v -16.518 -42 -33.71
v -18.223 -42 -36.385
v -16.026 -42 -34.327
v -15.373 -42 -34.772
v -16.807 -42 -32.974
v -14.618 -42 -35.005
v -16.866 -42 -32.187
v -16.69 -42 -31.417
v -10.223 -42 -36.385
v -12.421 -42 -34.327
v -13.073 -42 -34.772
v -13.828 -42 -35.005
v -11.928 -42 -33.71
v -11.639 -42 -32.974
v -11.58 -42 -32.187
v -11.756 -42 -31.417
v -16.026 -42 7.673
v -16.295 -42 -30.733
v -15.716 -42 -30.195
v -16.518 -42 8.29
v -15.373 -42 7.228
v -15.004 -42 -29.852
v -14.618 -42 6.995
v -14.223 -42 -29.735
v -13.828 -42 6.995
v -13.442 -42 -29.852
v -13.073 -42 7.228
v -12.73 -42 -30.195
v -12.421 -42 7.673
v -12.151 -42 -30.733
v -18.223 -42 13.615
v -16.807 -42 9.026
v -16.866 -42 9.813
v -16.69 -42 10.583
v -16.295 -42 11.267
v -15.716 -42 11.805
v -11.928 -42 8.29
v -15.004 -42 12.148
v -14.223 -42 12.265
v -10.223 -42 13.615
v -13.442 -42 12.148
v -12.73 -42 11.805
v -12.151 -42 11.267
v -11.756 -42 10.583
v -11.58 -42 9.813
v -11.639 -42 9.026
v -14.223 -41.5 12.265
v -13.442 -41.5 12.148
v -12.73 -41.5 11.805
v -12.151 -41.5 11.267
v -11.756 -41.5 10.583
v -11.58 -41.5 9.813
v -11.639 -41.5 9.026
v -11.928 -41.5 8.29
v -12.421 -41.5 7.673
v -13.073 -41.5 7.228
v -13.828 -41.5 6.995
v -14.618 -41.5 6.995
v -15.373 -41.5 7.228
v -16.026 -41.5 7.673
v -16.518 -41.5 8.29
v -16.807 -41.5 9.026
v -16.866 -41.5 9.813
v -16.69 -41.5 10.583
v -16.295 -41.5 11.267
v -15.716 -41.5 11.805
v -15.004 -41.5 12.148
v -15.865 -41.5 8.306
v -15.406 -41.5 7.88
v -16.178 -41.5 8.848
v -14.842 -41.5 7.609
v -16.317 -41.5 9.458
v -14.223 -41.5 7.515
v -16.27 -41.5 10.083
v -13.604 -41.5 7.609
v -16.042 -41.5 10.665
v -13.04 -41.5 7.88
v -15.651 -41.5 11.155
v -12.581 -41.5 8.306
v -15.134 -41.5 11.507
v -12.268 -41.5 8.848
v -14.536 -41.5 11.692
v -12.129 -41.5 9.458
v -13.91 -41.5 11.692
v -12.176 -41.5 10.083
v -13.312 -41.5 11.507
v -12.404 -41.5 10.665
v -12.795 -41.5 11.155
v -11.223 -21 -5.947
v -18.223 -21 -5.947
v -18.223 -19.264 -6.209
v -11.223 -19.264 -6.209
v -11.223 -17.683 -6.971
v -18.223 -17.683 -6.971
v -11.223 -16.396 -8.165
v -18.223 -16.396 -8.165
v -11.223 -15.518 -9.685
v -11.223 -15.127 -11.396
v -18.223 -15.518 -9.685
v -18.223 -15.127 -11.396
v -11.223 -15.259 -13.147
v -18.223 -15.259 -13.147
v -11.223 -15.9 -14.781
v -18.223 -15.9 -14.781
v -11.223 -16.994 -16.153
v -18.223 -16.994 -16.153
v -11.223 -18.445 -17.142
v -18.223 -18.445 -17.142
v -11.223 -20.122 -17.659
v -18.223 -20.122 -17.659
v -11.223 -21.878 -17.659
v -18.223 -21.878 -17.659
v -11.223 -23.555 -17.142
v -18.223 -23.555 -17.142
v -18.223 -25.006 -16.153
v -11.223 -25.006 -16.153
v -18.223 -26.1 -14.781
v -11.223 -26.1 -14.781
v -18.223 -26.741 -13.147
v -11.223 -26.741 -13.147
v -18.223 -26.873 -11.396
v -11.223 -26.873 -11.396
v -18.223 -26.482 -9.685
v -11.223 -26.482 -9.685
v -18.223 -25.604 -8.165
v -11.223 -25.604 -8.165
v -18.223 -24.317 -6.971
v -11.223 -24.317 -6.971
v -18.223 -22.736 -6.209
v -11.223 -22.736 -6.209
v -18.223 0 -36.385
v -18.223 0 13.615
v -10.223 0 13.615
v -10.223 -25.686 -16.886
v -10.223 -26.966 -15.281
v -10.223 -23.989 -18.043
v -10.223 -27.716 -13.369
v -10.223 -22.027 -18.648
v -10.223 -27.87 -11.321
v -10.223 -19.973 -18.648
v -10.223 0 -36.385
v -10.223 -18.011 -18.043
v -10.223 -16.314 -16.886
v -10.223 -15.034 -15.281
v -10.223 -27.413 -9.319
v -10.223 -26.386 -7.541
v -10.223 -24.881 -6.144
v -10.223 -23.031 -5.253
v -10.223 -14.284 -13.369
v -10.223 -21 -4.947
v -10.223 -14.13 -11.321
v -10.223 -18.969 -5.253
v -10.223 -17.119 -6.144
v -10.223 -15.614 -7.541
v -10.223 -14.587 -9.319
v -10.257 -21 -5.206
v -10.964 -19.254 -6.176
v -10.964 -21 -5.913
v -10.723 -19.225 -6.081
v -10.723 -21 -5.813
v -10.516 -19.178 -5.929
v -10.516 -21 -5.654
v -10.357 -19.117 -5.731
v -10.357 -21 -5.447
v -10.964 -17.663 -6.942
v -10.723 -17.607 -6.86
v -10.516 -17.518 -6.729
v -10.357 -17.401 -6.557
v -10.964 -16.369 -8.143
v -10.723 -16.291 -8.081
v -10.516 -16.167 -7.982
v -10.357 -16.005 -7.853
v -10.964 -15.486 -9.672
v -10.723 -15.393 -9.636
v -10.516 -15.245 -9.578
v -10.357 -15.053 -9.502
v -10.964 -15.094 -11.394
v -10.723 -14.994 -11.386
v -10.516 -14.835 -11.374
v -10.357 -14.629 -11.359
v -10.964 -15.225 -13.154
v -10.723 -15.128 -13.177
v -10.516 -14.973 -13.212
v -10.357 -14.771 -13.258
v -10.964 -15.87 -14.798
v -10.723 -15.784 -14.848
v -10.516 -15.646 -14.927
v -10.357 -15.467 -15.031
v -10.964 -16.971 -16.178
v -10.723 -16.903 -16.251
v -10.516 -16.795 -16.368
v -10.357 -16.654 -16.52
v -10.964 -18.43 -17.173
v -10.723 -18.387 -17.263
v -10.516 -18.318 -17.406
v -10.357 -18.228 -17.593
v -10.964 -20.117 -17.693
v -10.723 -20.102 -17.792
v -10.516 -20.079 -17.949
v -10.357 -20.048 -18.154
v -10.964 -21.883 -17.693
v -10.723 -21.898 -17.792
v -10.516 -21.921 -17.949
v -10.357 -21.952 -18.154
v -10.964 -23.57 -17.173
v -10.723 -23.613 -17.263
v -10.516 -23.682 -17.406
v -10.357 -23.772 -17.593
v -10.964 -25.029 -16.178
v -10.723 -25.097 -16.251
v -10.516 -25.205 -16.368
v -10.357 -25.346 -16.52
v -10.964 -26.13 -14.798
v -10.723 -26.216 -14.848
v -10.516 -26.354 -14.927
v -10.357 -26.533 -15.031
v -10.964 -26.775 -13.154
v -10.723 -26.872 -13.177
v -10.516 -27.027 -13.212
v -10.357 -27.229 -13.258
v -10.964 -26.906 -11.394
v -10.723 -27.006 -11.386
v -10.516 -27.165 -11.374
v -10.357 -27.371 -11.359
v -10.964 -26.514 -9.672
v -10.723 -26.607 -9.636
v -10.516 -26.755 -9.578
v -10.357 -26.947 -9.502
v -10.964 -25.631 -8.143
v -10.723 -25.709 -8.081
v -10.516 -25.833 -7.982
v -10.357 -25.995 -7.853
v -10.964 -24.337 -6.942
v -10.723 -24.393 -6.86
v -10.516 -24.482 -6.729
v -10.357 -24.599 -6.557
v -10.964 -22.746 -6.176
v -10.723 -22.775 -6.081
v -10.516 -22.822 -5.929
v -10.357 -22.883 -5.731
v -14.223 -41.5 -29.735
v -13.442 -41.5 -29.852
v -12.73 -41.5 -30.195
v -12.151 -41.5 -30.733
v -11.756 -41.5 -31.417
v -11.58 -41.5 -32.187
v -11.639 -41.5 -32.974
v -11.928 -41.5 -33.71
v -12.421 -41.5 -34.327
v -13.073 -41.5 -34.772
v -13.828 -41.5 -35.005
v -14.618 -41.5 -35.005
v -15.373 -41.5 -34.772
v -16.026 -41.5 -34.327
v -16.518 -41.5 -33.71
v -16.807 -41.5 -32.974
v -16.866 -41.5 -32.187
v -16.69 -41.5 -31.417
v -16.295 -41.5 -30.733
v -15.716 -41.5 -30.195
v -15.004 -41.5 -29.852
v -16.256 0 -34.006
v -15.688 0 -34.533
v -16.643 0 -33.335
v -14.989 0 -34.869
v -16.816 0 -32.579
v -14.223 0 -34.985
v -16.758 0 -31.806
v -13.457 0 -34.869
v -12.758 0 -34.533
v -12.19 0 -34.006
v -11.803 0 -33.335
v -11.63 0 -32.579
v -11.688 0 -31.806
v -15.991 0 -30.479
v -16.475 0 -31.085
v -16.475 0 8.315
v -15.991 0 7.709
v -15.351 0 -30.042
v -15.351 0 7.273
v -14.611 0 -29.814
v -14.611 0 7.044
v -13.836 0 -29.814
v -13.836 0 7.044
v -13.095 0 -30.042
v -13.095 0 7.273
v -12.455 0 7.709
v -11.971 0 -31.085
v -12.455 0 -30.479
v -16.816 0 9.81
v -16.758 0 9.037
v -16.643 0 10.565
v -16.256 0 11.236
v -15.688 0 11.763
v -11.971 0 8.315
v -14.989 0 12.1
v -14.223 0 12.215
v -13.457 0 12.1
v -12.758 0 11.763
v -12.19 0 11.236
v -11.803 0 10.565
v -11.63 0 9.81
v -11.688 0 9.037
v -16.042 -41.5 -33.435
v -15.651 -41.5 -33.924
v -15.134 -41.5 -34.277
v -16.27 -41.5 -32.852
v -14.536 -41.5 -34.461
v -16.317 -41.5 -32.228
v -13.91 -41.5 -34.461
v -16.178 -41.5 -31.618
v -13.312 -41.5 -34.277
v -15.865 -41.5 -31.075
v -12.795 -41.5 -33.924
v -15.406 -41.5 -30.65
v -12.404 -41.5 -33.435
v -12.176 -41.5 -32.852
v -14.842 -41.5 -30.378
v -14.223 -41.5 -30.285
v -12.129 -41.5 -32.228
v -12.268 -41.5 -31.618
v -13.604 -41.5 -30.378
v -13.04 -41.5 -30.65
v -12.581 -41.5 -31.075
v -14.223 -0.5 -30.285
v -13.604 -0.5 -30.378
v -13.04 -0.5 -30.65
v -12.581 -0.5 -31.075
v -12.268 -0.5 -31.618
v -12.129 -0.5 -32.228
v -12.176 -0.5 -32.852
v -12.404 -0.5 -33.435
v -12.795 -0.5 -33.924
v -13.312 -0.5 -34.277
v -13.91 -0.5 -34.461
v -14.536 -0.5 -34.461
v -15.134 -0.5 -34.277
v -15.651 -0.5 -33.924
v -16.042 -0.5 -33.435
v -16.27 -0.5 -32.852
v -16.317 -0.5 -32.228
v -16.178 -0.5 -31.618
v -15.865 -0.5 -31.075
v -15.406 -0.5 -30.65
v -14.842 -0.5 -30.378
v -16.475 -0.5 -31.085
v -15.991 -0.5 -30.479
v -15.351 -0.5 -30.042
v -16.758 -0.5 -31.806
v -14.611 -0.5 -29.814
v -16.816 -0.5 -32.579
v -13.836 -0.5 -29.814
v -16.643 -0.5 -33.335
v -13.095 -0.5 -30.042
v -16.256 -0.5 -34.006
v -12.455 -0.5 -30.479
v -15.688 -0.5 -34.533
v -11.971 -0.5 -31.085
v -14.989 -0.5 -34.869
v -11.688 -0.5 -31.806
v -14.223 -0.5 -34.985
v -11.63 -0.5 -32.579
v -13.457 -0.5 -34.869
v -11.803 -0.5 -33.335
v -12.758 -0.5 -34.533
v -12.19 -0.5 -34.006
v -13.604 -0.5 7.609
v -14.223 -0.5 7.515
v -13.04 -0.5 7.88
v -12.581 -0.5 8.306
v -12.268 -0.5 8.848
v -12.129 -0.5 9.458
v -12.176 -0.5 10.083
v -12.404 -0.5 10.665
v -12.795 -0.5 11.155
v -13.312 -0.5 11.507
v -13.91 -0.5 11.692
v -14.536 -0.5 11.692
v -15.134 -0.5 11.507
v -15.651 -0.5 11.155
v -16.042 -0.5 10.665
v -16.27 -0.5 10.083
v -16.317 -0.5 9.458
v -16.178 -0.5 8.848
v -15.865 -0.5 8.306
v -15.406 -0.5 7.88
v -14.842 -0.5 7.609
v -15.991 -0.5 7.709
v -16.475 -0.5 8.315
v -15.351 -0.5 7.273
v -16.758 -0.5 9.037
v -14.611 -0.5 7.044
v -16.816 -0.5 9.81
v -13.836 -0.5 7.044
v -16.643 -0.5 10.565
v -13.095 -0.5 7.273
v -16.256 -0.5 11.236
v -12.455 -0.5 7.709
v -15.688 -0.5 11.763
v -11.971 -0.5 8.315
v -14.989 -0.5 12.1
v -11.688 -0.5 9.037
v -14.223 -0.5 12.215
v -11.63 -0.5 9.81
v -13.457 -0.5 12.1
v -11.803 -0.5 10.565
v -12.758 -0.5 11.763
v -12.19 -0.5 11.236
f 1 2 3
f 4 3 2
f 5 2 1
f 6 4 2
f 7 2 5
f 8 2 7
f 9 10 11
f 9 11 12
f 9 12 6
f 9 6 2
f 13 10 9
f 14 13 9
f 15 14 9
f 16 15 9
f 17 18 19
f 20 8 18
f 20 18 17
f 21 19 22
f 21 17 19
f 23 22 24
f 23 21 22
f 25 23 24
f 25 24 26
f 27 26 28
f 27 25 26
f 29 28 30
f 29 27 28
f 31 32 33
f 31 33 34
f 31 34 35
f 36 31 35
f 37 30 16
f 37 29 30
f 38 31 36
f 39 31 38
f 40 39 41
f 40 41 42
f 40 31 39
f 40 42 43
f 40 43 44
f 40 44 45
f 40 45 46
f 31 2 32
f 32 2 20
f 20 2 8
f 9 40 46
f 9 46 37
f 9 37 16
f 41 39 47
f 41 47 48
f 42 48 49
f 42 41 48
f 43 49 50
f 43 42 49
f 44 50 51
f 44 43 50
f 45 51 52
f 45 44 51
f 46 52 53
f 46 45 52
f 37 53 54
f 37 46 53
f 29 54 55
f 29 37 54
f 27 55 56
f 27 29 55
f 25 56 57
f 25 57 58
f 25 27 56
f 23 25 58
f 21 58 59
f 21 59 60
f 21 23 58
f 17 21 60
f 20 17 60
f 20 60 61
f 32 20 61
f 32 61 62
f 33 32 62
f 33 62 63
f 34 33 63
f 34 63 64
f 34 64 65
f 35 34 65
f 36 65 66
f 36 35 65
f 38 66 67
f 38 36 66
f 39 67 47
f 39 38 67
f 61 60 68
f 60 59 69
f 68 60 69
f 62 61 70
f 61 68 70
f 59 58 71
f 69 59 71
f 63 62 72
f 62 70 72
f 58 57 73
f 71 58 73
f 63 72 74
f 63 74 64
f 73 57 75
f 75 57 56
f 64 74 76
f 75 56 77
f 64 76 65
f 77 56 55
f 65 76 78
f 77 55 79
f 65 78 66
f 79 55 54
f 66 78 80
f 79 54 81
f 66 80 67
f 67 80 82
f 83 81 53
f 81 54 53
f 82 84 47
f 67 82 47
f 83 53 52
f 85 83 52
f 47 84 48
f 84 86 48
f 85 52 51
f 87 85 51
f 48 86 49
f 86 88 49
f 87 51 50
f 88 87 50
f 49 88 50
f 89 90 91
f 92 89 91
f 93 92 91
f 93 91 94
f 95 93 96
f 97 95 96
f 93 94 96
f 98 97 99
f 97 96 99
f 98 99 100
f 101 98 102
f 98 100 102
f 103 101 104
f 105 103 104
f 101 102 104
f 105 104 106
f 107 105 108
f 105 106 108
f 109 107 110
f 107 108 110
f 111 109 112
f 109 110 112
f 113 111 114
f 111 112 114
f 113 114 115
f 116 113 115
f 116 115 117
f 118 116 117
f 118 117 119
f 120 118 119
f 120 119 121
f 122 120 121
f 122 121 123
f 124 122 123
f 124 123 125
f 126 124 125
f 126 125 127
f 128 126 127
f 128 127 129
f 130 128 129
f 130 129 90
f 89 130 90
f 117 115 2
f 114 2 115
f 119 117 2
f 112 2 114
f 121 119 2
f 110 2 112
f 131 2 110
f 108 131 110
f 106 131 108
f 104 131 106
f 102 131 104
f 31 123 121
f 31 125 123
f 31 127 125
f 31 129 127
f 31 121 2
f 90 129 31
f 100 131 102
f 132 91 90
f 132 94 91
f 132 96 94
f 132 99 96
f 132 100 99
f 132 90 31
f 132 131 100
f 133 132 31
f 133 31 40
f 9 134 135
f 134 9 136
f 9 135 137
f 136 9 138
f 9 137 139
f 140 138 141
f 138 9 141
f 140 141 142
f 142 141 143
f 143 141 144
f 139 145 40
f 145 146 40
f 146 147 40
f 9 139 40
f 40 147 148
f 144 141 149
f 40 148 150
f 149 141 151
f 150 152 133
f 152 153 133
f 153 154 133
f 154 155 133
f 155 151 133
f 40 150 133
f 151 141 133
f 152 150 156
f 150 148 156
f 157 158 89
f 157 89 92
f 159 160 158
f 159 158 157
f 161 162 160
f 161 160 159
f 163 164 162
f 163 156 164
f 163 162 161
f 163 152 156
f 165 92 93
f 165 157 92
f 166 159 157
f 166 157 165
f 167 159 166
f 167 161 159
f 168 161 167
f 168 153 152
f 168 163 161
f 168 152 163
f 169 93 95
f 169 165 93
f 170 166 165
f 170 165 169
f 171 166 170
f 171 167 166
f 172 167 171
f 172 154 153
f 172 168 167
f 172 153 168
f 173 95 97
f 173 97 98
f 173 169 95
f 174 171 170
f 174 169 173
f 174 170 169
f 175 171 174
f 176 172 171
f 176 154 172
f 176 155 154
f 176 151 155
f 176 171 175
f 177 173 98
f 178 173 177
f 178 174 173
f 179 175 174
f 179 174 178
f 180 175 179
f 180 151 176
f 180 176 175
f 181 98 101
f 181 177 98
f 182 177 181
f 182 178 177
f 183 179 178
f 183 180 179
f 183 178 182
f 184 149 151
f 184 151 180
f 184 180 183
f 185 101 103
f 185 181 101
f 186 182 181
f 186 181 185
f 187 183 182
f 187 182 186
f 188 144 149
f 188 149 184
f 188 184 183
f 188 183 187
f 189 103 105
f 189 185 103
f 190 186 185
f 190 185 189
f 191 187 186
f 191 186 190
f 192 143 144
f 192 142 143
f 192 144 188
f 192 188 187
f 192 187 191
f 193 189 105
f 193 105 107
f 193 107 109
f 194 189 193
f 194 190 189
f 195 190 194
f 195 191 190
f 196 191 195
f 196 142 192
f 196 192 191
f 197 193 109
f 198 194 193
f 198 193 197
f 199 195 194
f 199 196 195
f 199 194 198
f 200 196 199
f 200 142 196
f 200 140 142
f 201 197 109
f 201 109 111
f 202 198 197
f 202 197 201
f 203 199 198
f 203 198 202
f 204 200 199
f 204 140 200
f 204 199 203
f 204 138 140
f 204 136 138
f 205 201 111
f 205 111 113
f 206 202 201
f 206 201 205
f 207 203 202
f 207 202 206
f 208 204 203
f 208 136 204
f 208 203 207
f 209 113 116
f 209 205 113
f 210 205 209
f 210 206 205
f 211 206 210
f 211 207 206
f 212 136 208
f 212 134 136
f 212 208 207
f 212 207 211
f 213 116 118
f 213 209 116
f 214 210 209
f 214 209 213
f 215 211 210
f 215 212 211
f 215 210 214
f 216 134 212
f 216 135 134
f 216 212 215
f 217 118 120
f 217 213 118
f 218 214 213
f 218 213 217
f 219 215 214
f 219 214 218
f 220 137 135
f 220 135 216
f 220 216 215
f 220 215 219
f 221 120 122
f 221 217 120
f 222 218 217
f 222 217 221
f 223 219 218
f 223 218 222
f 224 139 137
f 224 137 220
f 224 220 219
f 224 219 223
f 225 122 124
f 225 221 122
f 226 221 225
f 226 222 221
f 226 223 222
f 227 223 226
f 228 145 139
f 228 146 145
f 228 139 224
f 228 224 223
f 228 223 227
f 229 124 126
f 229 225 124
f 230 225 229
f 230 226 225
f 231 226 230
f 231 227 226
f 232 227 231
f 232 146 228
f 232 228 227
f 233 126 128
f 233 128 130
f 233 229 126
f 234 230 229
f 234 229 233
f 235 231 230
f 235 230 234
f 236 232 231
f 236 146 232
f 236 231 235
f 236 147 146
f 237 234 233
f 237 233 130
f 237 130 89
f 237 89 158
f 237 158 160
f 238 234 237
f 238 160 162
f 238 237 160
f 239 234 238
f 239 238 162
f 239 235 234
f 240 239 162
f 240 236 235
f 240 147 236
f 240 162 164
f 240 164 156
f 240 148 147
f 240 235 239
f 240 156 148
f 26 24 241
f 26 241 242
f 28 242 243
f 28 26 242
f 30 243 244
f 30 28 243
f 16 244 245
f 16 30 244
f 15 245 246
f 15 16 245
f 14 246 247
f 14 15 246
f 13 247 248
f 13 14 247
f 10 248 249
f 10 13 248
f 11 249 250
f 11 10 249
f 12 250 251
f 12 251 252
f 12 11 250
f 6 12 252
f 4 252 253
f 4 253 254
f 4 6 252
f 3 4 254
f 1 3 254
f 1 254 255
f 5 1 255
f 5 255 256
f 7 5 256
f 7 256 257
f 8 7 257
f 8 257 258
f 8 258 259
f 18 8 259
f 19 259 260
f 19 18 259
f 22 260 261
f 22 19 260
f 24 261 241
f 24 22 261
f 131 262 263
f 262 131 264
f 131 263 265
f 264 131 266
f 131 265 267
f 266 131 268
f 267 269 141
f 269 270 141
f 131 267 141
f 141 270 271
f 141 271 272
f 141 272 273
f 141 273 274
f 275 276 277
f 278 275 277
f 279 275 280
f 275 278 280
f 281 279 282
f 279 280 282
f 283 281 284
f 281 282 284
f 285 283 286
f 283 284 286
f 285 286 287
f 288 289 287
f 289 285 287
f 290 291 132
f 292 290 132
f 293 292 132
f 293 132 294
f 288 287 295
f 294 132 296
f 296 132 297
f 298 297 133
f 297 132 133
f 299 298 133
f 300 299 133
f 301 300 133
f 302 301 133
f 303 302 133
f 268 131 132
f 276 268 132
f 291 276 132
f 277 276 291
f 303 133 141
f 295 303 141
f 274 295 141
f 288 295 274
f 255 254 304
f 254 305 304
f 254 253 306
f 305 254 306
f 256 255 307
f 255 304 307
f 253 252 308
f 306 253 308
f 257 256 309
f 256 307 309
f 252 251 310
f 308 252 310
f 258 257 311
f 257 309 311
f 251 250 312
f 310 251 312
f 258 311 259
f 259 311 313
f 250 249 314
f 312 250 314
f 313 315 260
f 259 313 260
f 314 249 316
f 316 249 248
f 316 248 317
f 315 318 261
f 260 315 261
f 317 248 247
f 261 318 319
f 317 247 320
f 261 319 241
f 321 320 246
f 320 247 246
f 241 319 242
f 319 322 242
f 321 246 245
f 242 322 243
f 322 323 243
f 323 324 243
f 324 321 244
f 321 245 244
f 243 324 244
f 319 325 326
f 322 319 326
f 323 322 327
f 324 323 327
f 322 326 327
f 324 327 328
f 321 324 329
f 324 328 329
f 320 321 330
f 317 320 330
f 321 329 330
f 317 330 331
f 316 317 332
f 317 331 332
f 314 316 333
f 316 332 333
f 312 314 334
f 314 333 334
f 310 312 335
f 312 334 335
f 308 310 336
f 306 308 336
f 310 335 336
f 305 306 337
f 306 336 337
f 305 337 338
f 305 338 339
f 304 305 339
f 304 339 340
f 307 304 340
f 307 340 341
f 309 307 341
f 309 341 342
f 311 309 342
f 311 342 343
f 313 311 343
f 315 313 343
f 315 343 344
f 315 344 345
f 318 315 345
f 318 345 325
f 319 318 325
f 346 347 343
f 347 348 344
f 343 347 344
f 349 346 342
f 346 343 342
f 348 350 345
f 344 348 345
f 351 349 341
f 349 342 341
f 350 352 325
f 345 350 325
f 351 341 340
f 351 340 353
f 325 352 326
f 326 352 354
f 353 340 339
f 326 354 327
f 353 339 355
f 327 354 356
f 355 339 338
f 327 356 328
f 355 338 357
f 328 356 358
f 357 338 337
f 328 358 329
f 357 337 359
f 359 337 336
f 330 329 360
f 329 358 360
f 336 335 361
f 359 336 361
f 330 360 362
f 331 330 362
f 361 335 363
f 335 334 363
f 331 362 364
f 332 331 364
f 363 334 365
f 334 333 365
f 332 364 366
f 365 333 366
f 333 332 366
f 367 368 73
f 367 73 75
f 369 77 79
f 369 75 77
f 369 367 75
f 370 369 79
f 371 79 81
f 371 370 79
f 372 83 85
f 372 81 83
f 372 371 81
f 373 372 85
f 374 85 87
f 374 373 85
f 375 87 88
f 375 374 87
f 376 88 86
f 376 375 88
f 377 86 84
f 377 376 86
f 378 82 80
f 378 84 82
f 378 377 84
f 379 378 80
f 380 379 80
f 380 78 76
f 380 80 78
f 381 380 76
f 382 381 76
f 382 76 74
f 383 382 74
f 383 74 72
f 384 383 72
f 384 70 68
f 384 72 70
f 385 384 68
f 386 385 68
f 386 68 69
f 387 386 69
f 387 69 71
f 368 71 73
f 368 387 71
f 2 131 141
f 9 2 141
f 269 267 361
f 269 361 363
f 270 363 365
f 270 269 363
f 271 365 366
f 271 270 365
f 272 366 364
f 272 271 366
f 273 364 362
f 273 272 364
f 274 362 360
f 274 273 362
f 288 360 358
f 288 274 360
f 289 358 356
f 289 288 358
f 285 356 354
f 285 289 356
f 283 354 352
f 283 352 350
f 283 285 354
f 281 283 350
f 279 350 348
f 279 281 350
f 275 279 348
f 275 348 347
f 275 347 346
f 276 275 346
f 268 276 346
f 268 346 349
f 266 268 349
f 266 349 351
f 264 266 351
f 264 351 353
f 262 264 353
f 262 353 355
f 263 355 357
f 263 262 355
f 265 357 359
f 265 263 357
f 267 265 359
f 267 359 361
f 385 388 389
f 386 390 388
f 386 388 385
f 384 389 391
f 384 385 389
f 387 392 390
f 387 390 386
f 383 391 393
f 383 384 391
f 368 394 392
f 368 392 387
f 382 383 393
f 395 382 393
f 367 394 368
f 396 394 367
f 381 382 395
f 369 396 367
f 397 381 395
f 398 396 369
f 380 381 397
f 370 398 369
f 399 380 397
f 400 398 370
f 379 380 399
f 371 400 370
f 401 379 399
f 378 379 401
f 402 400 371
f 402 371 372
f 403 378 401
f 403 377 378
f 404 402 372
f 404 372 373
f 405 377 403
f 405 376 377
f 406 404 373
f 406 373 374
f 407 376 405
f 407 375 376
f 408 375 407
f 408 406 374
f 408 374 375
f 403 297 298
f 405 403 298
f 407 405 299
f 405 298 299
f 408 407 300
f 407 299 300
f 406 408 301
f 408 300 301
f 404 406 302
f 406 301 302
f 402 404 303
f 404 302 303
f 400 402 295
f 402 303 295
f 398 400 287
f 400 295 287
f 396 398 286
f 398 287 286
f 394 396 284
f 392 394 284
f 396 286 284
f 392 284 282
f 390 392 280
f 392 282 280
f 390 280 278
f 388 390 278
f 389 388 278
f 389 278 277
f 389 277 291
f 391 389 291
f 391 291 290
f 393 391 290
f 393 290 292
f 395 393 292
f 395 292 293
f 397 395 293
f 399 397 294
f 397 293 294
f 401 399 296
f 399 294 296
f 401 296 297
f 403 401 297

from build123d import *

# Parameters (mm, degrees)
SKETCH1_W           = 25
SKETCH1_H           = 50
SKETCH1_R           = 3.4
BOSS_EXTRUDE1_DEPTH = 3
SKETCH2_W           = 50
SKETCH2_H           = 3
BOSS_EXTRUDE2_DEPTH = 8
SKETCH3_W           = 8
SKETCH3_H           = 50
BOSS_EXTRUDE3_DEPTH = 42
SKETCH4_R           = 2.65
CUT_EXTRUDE1_DEPTH  = 0.5
SKETCH5_R           = 5.888972746
CUT_EXTRUDE2_DEPTH  = 9
FILLET2_R           = 1
SKETCH6_R           = 12.6
BOSS_EXTRUDE4_DEPTH = 2
FILLET4_R           = 1
SKETCH8_R           = 1.589780168
SKETCH8_R_2         = 1.777428262
CUT_EXTRUDE3_DEPTH  = 10
SKETCH9_W           = 49.021678163
SKETCH9_H           = 20.976854622
CUT_EXTRUDE4_DEPTH  = 68.79439129
SKETCH11_R          = 2.1
CUT_EXTRUDE5_DEPTH  = 59.480168703
SKETCH14_R          = 2.6
CUT_EXTRUDE6_DEPTH  = 0.5


with BuildPart() as part:
    # Sketch1 → Boss-Extrude1 (new body)
    with BuildSketch(Plane(origin=(0, 0, 0), x_dir=(1, 0, 0), z_dir=(0, 1, 0))):
        with Locations((2.276951673, 11.384758364)):
            Rectangle(SKETCH1_W, SKETCH1_H)
        with Locations(Location((1.276951673, 11.384758364, 0), (0, 0, 270))):
            Circle(SKETCH1_R, mode=Mode.SUBTRACT)
    extrude(amount=BOSS_EXTRUDE1_DEPTH)

    # Sketch2 → Boss-Extrude2 (add)
    with BuildSketch(Plane.ZY.offset(10.223048327)):
        with Locations((-11.384758364, 1.5)):
            Rectangle(SKETCH2_W, SKETCH2_H)
    extrude(amount=BOSS_EXTRUDE2_DEPTH)

    # Sketch3 → Boss-Extrude3 (add)
    with BuildSketch(Plane.XZ):
        with Locations((-14.223048327, -11.384758364)):
            Rectangle(SKETCH3_W, SKETCH3_H)
    extrude(amount=BOSS_EXTRUDE3_DEPTH)

    # Sketch4 → Cut-Extrude1 (cut)
    with BuildSketch(Plane(origin=(0, 3, 0), x_dir=(1, 0, 0), z_dir=(0, 1, 0))):
        with Locations(Location((-14.223048327, 32.384758364, 0), (0, 0, 270))):
            Circle(SKETCH4_R)
        with Locations(Location((-14.223048327, -9.615241636, 0), (0, 0, 270))):
            Circle(SKETCH4_R)
    cut_extrude1 = extrude(amount=-CUT_EXTRUDE1_DEPTH, mode=Mode.SUBTRACT)

    # Mirror1: Cut-Extrude1 across plane
    add(cut_extrude1.mirror(Plane.ZX.offset(-19.5)), mode=Mode.SUBTRACT)

    # Sketch5 → Cut-Extrude2 (cut)
    with BuildSketch(Plane.ZY.offset(18.223048327)):
        with Locations((-11.836279124, -21)):
            Circle(SKETCH5_R)
    extrude(amount=-CUT_EXTRUDE2_DEPTH, mode=Mode.SUBTRACT)

    # Fillet2
    fillet2_edges = [part.edges().sort_by_distance(p)[0] for p in [
        (-10.223048327, -21, -17.72525187),
    ]]
    fillet(fillet2_edges, radius=FILLET2_R)

    # Mirror2: Cut-Extrude1 across plane
    add(cut_extrude1.mirror(Plane.ZY.offset(1.723048327)), mode=Mode.SUBTRACT)

    # Sketch6 → Boss-Extrude4 (add)
    with BuildSketch(Plane(origin=(0, 3, 0), x_dir=(1, 0, 0), z_dir=(0, 1, 0))):
        with BuildLine():
            Line((14.776951673, 5.825082115), (14.776951673, 16.944434614))
            ThreePointArc((14.776951673, 16.944434614), (-13.323048327, 11.384758364), (14.776951673, 5.825082115))
        make_face()
        with Locations(Location((1.276951673, 11.384758364, 0), (0, 0, 270))):
            Circle(SKETCH6_R, mode=Mode.SUBTRACT)
    extrude(amount=BOSS_EXTRUDE4_DEPTH)

    # Fillet4
    # the kernel refuses this fillet: 1 mm, written as the material it takes off along each edge
    with BuildSketch(Plane(origin=(14.776951673, 5, -3.325082115), x_dir=(0, -1, 0), z_dir=(0, 0, -1))) as fillet4_piece_1:
        with BuildLine():
            CenterArc((FILLET4_R, FILLET4_R), FILLET4_R, 180, 90)
            Line((0, FILLET4_R), (0, 0))
            Line((0, 0), (FILLET4_R, 0))
        make_face()
    extrude(amount=16.119352499, mode=Mode.SUBTRACT)

    # Sketch8 → Cut-Extrude3 (cut)
    with BuildSketch(Plane(origin=(0, 3, 0), x_dir=(1, 0, 0), z_dir=(0, 1, 0))):
        with Locations(Location((1.276951673, 19.884758364, 0), (0, 0, 270))):
            Circle(SKETCH8_R)
        with Locations(Location((1.276951673, 2.884758364, 0), (0, 0, 270))):
            Circle(SKETCH8_R_2)
    extrude(amount=-CUT_EXTRUDE3_DEPTH, mode=Mode.SUBTRACT)

    # Sketch9 → Cut-Extrude4 (cut, through all)
    with BuildSketch(Plane.XY.offset(13.615241636)):
        with Locations((-9.733887409, 10.488427311)):
            Rectangle(SKETCH9_W, SKETCH9_H)
    extrude(amount=-CUT_EXTRUDE4_DEPTH, mode=Mode.SUBTRACT)

    # Sketch11 → Cut-Extrude5 (cut, through all)
    with BuildSketch(Plane(origin=(0, 0, 0), x_dir=(1, 0, 0), z_dir=(0, 1, 0))):
        with Locations(Location((-14.223048327, 32.384758364, 0), (0, 0, 270))):
            Circle(SKETCH11_R)
    cut_extrude5 = extrude(amount=-CUT_EXTRUDE5_DEPTH, mode=Mode.SUBTRACT)

    # Mirror3: Cut-Extrude5 across plane
    add(cut_extrude5.mirror(Plane.XY.offset(-11.384758364)), mode=Mode.SUBTRACT)

    # Sketch14 → Cut-Extrude6 (cut)
    with BuildSketch(Plane(origin=(0, 0, 0), x_dir=(1, 0, 0), z_dir=(0, 1, 0))):
        with Locations(Location((-14.223048327, -9.615241636, 0), (0, 0, 270))):
            Circle(SKETCH14_R)
    cut_extrude6 = extrude(amount=-CUT_EXTRUDE6_DEPTH, mode=Mode.SUBTRACT)

    # Mirror4: Cut-Extrude6 across plane
    add(cut_extrude6.mirror(Plane.XY.offset(-11.384758364)), mode=Mode.SUBTRACT)


solid = part.part
